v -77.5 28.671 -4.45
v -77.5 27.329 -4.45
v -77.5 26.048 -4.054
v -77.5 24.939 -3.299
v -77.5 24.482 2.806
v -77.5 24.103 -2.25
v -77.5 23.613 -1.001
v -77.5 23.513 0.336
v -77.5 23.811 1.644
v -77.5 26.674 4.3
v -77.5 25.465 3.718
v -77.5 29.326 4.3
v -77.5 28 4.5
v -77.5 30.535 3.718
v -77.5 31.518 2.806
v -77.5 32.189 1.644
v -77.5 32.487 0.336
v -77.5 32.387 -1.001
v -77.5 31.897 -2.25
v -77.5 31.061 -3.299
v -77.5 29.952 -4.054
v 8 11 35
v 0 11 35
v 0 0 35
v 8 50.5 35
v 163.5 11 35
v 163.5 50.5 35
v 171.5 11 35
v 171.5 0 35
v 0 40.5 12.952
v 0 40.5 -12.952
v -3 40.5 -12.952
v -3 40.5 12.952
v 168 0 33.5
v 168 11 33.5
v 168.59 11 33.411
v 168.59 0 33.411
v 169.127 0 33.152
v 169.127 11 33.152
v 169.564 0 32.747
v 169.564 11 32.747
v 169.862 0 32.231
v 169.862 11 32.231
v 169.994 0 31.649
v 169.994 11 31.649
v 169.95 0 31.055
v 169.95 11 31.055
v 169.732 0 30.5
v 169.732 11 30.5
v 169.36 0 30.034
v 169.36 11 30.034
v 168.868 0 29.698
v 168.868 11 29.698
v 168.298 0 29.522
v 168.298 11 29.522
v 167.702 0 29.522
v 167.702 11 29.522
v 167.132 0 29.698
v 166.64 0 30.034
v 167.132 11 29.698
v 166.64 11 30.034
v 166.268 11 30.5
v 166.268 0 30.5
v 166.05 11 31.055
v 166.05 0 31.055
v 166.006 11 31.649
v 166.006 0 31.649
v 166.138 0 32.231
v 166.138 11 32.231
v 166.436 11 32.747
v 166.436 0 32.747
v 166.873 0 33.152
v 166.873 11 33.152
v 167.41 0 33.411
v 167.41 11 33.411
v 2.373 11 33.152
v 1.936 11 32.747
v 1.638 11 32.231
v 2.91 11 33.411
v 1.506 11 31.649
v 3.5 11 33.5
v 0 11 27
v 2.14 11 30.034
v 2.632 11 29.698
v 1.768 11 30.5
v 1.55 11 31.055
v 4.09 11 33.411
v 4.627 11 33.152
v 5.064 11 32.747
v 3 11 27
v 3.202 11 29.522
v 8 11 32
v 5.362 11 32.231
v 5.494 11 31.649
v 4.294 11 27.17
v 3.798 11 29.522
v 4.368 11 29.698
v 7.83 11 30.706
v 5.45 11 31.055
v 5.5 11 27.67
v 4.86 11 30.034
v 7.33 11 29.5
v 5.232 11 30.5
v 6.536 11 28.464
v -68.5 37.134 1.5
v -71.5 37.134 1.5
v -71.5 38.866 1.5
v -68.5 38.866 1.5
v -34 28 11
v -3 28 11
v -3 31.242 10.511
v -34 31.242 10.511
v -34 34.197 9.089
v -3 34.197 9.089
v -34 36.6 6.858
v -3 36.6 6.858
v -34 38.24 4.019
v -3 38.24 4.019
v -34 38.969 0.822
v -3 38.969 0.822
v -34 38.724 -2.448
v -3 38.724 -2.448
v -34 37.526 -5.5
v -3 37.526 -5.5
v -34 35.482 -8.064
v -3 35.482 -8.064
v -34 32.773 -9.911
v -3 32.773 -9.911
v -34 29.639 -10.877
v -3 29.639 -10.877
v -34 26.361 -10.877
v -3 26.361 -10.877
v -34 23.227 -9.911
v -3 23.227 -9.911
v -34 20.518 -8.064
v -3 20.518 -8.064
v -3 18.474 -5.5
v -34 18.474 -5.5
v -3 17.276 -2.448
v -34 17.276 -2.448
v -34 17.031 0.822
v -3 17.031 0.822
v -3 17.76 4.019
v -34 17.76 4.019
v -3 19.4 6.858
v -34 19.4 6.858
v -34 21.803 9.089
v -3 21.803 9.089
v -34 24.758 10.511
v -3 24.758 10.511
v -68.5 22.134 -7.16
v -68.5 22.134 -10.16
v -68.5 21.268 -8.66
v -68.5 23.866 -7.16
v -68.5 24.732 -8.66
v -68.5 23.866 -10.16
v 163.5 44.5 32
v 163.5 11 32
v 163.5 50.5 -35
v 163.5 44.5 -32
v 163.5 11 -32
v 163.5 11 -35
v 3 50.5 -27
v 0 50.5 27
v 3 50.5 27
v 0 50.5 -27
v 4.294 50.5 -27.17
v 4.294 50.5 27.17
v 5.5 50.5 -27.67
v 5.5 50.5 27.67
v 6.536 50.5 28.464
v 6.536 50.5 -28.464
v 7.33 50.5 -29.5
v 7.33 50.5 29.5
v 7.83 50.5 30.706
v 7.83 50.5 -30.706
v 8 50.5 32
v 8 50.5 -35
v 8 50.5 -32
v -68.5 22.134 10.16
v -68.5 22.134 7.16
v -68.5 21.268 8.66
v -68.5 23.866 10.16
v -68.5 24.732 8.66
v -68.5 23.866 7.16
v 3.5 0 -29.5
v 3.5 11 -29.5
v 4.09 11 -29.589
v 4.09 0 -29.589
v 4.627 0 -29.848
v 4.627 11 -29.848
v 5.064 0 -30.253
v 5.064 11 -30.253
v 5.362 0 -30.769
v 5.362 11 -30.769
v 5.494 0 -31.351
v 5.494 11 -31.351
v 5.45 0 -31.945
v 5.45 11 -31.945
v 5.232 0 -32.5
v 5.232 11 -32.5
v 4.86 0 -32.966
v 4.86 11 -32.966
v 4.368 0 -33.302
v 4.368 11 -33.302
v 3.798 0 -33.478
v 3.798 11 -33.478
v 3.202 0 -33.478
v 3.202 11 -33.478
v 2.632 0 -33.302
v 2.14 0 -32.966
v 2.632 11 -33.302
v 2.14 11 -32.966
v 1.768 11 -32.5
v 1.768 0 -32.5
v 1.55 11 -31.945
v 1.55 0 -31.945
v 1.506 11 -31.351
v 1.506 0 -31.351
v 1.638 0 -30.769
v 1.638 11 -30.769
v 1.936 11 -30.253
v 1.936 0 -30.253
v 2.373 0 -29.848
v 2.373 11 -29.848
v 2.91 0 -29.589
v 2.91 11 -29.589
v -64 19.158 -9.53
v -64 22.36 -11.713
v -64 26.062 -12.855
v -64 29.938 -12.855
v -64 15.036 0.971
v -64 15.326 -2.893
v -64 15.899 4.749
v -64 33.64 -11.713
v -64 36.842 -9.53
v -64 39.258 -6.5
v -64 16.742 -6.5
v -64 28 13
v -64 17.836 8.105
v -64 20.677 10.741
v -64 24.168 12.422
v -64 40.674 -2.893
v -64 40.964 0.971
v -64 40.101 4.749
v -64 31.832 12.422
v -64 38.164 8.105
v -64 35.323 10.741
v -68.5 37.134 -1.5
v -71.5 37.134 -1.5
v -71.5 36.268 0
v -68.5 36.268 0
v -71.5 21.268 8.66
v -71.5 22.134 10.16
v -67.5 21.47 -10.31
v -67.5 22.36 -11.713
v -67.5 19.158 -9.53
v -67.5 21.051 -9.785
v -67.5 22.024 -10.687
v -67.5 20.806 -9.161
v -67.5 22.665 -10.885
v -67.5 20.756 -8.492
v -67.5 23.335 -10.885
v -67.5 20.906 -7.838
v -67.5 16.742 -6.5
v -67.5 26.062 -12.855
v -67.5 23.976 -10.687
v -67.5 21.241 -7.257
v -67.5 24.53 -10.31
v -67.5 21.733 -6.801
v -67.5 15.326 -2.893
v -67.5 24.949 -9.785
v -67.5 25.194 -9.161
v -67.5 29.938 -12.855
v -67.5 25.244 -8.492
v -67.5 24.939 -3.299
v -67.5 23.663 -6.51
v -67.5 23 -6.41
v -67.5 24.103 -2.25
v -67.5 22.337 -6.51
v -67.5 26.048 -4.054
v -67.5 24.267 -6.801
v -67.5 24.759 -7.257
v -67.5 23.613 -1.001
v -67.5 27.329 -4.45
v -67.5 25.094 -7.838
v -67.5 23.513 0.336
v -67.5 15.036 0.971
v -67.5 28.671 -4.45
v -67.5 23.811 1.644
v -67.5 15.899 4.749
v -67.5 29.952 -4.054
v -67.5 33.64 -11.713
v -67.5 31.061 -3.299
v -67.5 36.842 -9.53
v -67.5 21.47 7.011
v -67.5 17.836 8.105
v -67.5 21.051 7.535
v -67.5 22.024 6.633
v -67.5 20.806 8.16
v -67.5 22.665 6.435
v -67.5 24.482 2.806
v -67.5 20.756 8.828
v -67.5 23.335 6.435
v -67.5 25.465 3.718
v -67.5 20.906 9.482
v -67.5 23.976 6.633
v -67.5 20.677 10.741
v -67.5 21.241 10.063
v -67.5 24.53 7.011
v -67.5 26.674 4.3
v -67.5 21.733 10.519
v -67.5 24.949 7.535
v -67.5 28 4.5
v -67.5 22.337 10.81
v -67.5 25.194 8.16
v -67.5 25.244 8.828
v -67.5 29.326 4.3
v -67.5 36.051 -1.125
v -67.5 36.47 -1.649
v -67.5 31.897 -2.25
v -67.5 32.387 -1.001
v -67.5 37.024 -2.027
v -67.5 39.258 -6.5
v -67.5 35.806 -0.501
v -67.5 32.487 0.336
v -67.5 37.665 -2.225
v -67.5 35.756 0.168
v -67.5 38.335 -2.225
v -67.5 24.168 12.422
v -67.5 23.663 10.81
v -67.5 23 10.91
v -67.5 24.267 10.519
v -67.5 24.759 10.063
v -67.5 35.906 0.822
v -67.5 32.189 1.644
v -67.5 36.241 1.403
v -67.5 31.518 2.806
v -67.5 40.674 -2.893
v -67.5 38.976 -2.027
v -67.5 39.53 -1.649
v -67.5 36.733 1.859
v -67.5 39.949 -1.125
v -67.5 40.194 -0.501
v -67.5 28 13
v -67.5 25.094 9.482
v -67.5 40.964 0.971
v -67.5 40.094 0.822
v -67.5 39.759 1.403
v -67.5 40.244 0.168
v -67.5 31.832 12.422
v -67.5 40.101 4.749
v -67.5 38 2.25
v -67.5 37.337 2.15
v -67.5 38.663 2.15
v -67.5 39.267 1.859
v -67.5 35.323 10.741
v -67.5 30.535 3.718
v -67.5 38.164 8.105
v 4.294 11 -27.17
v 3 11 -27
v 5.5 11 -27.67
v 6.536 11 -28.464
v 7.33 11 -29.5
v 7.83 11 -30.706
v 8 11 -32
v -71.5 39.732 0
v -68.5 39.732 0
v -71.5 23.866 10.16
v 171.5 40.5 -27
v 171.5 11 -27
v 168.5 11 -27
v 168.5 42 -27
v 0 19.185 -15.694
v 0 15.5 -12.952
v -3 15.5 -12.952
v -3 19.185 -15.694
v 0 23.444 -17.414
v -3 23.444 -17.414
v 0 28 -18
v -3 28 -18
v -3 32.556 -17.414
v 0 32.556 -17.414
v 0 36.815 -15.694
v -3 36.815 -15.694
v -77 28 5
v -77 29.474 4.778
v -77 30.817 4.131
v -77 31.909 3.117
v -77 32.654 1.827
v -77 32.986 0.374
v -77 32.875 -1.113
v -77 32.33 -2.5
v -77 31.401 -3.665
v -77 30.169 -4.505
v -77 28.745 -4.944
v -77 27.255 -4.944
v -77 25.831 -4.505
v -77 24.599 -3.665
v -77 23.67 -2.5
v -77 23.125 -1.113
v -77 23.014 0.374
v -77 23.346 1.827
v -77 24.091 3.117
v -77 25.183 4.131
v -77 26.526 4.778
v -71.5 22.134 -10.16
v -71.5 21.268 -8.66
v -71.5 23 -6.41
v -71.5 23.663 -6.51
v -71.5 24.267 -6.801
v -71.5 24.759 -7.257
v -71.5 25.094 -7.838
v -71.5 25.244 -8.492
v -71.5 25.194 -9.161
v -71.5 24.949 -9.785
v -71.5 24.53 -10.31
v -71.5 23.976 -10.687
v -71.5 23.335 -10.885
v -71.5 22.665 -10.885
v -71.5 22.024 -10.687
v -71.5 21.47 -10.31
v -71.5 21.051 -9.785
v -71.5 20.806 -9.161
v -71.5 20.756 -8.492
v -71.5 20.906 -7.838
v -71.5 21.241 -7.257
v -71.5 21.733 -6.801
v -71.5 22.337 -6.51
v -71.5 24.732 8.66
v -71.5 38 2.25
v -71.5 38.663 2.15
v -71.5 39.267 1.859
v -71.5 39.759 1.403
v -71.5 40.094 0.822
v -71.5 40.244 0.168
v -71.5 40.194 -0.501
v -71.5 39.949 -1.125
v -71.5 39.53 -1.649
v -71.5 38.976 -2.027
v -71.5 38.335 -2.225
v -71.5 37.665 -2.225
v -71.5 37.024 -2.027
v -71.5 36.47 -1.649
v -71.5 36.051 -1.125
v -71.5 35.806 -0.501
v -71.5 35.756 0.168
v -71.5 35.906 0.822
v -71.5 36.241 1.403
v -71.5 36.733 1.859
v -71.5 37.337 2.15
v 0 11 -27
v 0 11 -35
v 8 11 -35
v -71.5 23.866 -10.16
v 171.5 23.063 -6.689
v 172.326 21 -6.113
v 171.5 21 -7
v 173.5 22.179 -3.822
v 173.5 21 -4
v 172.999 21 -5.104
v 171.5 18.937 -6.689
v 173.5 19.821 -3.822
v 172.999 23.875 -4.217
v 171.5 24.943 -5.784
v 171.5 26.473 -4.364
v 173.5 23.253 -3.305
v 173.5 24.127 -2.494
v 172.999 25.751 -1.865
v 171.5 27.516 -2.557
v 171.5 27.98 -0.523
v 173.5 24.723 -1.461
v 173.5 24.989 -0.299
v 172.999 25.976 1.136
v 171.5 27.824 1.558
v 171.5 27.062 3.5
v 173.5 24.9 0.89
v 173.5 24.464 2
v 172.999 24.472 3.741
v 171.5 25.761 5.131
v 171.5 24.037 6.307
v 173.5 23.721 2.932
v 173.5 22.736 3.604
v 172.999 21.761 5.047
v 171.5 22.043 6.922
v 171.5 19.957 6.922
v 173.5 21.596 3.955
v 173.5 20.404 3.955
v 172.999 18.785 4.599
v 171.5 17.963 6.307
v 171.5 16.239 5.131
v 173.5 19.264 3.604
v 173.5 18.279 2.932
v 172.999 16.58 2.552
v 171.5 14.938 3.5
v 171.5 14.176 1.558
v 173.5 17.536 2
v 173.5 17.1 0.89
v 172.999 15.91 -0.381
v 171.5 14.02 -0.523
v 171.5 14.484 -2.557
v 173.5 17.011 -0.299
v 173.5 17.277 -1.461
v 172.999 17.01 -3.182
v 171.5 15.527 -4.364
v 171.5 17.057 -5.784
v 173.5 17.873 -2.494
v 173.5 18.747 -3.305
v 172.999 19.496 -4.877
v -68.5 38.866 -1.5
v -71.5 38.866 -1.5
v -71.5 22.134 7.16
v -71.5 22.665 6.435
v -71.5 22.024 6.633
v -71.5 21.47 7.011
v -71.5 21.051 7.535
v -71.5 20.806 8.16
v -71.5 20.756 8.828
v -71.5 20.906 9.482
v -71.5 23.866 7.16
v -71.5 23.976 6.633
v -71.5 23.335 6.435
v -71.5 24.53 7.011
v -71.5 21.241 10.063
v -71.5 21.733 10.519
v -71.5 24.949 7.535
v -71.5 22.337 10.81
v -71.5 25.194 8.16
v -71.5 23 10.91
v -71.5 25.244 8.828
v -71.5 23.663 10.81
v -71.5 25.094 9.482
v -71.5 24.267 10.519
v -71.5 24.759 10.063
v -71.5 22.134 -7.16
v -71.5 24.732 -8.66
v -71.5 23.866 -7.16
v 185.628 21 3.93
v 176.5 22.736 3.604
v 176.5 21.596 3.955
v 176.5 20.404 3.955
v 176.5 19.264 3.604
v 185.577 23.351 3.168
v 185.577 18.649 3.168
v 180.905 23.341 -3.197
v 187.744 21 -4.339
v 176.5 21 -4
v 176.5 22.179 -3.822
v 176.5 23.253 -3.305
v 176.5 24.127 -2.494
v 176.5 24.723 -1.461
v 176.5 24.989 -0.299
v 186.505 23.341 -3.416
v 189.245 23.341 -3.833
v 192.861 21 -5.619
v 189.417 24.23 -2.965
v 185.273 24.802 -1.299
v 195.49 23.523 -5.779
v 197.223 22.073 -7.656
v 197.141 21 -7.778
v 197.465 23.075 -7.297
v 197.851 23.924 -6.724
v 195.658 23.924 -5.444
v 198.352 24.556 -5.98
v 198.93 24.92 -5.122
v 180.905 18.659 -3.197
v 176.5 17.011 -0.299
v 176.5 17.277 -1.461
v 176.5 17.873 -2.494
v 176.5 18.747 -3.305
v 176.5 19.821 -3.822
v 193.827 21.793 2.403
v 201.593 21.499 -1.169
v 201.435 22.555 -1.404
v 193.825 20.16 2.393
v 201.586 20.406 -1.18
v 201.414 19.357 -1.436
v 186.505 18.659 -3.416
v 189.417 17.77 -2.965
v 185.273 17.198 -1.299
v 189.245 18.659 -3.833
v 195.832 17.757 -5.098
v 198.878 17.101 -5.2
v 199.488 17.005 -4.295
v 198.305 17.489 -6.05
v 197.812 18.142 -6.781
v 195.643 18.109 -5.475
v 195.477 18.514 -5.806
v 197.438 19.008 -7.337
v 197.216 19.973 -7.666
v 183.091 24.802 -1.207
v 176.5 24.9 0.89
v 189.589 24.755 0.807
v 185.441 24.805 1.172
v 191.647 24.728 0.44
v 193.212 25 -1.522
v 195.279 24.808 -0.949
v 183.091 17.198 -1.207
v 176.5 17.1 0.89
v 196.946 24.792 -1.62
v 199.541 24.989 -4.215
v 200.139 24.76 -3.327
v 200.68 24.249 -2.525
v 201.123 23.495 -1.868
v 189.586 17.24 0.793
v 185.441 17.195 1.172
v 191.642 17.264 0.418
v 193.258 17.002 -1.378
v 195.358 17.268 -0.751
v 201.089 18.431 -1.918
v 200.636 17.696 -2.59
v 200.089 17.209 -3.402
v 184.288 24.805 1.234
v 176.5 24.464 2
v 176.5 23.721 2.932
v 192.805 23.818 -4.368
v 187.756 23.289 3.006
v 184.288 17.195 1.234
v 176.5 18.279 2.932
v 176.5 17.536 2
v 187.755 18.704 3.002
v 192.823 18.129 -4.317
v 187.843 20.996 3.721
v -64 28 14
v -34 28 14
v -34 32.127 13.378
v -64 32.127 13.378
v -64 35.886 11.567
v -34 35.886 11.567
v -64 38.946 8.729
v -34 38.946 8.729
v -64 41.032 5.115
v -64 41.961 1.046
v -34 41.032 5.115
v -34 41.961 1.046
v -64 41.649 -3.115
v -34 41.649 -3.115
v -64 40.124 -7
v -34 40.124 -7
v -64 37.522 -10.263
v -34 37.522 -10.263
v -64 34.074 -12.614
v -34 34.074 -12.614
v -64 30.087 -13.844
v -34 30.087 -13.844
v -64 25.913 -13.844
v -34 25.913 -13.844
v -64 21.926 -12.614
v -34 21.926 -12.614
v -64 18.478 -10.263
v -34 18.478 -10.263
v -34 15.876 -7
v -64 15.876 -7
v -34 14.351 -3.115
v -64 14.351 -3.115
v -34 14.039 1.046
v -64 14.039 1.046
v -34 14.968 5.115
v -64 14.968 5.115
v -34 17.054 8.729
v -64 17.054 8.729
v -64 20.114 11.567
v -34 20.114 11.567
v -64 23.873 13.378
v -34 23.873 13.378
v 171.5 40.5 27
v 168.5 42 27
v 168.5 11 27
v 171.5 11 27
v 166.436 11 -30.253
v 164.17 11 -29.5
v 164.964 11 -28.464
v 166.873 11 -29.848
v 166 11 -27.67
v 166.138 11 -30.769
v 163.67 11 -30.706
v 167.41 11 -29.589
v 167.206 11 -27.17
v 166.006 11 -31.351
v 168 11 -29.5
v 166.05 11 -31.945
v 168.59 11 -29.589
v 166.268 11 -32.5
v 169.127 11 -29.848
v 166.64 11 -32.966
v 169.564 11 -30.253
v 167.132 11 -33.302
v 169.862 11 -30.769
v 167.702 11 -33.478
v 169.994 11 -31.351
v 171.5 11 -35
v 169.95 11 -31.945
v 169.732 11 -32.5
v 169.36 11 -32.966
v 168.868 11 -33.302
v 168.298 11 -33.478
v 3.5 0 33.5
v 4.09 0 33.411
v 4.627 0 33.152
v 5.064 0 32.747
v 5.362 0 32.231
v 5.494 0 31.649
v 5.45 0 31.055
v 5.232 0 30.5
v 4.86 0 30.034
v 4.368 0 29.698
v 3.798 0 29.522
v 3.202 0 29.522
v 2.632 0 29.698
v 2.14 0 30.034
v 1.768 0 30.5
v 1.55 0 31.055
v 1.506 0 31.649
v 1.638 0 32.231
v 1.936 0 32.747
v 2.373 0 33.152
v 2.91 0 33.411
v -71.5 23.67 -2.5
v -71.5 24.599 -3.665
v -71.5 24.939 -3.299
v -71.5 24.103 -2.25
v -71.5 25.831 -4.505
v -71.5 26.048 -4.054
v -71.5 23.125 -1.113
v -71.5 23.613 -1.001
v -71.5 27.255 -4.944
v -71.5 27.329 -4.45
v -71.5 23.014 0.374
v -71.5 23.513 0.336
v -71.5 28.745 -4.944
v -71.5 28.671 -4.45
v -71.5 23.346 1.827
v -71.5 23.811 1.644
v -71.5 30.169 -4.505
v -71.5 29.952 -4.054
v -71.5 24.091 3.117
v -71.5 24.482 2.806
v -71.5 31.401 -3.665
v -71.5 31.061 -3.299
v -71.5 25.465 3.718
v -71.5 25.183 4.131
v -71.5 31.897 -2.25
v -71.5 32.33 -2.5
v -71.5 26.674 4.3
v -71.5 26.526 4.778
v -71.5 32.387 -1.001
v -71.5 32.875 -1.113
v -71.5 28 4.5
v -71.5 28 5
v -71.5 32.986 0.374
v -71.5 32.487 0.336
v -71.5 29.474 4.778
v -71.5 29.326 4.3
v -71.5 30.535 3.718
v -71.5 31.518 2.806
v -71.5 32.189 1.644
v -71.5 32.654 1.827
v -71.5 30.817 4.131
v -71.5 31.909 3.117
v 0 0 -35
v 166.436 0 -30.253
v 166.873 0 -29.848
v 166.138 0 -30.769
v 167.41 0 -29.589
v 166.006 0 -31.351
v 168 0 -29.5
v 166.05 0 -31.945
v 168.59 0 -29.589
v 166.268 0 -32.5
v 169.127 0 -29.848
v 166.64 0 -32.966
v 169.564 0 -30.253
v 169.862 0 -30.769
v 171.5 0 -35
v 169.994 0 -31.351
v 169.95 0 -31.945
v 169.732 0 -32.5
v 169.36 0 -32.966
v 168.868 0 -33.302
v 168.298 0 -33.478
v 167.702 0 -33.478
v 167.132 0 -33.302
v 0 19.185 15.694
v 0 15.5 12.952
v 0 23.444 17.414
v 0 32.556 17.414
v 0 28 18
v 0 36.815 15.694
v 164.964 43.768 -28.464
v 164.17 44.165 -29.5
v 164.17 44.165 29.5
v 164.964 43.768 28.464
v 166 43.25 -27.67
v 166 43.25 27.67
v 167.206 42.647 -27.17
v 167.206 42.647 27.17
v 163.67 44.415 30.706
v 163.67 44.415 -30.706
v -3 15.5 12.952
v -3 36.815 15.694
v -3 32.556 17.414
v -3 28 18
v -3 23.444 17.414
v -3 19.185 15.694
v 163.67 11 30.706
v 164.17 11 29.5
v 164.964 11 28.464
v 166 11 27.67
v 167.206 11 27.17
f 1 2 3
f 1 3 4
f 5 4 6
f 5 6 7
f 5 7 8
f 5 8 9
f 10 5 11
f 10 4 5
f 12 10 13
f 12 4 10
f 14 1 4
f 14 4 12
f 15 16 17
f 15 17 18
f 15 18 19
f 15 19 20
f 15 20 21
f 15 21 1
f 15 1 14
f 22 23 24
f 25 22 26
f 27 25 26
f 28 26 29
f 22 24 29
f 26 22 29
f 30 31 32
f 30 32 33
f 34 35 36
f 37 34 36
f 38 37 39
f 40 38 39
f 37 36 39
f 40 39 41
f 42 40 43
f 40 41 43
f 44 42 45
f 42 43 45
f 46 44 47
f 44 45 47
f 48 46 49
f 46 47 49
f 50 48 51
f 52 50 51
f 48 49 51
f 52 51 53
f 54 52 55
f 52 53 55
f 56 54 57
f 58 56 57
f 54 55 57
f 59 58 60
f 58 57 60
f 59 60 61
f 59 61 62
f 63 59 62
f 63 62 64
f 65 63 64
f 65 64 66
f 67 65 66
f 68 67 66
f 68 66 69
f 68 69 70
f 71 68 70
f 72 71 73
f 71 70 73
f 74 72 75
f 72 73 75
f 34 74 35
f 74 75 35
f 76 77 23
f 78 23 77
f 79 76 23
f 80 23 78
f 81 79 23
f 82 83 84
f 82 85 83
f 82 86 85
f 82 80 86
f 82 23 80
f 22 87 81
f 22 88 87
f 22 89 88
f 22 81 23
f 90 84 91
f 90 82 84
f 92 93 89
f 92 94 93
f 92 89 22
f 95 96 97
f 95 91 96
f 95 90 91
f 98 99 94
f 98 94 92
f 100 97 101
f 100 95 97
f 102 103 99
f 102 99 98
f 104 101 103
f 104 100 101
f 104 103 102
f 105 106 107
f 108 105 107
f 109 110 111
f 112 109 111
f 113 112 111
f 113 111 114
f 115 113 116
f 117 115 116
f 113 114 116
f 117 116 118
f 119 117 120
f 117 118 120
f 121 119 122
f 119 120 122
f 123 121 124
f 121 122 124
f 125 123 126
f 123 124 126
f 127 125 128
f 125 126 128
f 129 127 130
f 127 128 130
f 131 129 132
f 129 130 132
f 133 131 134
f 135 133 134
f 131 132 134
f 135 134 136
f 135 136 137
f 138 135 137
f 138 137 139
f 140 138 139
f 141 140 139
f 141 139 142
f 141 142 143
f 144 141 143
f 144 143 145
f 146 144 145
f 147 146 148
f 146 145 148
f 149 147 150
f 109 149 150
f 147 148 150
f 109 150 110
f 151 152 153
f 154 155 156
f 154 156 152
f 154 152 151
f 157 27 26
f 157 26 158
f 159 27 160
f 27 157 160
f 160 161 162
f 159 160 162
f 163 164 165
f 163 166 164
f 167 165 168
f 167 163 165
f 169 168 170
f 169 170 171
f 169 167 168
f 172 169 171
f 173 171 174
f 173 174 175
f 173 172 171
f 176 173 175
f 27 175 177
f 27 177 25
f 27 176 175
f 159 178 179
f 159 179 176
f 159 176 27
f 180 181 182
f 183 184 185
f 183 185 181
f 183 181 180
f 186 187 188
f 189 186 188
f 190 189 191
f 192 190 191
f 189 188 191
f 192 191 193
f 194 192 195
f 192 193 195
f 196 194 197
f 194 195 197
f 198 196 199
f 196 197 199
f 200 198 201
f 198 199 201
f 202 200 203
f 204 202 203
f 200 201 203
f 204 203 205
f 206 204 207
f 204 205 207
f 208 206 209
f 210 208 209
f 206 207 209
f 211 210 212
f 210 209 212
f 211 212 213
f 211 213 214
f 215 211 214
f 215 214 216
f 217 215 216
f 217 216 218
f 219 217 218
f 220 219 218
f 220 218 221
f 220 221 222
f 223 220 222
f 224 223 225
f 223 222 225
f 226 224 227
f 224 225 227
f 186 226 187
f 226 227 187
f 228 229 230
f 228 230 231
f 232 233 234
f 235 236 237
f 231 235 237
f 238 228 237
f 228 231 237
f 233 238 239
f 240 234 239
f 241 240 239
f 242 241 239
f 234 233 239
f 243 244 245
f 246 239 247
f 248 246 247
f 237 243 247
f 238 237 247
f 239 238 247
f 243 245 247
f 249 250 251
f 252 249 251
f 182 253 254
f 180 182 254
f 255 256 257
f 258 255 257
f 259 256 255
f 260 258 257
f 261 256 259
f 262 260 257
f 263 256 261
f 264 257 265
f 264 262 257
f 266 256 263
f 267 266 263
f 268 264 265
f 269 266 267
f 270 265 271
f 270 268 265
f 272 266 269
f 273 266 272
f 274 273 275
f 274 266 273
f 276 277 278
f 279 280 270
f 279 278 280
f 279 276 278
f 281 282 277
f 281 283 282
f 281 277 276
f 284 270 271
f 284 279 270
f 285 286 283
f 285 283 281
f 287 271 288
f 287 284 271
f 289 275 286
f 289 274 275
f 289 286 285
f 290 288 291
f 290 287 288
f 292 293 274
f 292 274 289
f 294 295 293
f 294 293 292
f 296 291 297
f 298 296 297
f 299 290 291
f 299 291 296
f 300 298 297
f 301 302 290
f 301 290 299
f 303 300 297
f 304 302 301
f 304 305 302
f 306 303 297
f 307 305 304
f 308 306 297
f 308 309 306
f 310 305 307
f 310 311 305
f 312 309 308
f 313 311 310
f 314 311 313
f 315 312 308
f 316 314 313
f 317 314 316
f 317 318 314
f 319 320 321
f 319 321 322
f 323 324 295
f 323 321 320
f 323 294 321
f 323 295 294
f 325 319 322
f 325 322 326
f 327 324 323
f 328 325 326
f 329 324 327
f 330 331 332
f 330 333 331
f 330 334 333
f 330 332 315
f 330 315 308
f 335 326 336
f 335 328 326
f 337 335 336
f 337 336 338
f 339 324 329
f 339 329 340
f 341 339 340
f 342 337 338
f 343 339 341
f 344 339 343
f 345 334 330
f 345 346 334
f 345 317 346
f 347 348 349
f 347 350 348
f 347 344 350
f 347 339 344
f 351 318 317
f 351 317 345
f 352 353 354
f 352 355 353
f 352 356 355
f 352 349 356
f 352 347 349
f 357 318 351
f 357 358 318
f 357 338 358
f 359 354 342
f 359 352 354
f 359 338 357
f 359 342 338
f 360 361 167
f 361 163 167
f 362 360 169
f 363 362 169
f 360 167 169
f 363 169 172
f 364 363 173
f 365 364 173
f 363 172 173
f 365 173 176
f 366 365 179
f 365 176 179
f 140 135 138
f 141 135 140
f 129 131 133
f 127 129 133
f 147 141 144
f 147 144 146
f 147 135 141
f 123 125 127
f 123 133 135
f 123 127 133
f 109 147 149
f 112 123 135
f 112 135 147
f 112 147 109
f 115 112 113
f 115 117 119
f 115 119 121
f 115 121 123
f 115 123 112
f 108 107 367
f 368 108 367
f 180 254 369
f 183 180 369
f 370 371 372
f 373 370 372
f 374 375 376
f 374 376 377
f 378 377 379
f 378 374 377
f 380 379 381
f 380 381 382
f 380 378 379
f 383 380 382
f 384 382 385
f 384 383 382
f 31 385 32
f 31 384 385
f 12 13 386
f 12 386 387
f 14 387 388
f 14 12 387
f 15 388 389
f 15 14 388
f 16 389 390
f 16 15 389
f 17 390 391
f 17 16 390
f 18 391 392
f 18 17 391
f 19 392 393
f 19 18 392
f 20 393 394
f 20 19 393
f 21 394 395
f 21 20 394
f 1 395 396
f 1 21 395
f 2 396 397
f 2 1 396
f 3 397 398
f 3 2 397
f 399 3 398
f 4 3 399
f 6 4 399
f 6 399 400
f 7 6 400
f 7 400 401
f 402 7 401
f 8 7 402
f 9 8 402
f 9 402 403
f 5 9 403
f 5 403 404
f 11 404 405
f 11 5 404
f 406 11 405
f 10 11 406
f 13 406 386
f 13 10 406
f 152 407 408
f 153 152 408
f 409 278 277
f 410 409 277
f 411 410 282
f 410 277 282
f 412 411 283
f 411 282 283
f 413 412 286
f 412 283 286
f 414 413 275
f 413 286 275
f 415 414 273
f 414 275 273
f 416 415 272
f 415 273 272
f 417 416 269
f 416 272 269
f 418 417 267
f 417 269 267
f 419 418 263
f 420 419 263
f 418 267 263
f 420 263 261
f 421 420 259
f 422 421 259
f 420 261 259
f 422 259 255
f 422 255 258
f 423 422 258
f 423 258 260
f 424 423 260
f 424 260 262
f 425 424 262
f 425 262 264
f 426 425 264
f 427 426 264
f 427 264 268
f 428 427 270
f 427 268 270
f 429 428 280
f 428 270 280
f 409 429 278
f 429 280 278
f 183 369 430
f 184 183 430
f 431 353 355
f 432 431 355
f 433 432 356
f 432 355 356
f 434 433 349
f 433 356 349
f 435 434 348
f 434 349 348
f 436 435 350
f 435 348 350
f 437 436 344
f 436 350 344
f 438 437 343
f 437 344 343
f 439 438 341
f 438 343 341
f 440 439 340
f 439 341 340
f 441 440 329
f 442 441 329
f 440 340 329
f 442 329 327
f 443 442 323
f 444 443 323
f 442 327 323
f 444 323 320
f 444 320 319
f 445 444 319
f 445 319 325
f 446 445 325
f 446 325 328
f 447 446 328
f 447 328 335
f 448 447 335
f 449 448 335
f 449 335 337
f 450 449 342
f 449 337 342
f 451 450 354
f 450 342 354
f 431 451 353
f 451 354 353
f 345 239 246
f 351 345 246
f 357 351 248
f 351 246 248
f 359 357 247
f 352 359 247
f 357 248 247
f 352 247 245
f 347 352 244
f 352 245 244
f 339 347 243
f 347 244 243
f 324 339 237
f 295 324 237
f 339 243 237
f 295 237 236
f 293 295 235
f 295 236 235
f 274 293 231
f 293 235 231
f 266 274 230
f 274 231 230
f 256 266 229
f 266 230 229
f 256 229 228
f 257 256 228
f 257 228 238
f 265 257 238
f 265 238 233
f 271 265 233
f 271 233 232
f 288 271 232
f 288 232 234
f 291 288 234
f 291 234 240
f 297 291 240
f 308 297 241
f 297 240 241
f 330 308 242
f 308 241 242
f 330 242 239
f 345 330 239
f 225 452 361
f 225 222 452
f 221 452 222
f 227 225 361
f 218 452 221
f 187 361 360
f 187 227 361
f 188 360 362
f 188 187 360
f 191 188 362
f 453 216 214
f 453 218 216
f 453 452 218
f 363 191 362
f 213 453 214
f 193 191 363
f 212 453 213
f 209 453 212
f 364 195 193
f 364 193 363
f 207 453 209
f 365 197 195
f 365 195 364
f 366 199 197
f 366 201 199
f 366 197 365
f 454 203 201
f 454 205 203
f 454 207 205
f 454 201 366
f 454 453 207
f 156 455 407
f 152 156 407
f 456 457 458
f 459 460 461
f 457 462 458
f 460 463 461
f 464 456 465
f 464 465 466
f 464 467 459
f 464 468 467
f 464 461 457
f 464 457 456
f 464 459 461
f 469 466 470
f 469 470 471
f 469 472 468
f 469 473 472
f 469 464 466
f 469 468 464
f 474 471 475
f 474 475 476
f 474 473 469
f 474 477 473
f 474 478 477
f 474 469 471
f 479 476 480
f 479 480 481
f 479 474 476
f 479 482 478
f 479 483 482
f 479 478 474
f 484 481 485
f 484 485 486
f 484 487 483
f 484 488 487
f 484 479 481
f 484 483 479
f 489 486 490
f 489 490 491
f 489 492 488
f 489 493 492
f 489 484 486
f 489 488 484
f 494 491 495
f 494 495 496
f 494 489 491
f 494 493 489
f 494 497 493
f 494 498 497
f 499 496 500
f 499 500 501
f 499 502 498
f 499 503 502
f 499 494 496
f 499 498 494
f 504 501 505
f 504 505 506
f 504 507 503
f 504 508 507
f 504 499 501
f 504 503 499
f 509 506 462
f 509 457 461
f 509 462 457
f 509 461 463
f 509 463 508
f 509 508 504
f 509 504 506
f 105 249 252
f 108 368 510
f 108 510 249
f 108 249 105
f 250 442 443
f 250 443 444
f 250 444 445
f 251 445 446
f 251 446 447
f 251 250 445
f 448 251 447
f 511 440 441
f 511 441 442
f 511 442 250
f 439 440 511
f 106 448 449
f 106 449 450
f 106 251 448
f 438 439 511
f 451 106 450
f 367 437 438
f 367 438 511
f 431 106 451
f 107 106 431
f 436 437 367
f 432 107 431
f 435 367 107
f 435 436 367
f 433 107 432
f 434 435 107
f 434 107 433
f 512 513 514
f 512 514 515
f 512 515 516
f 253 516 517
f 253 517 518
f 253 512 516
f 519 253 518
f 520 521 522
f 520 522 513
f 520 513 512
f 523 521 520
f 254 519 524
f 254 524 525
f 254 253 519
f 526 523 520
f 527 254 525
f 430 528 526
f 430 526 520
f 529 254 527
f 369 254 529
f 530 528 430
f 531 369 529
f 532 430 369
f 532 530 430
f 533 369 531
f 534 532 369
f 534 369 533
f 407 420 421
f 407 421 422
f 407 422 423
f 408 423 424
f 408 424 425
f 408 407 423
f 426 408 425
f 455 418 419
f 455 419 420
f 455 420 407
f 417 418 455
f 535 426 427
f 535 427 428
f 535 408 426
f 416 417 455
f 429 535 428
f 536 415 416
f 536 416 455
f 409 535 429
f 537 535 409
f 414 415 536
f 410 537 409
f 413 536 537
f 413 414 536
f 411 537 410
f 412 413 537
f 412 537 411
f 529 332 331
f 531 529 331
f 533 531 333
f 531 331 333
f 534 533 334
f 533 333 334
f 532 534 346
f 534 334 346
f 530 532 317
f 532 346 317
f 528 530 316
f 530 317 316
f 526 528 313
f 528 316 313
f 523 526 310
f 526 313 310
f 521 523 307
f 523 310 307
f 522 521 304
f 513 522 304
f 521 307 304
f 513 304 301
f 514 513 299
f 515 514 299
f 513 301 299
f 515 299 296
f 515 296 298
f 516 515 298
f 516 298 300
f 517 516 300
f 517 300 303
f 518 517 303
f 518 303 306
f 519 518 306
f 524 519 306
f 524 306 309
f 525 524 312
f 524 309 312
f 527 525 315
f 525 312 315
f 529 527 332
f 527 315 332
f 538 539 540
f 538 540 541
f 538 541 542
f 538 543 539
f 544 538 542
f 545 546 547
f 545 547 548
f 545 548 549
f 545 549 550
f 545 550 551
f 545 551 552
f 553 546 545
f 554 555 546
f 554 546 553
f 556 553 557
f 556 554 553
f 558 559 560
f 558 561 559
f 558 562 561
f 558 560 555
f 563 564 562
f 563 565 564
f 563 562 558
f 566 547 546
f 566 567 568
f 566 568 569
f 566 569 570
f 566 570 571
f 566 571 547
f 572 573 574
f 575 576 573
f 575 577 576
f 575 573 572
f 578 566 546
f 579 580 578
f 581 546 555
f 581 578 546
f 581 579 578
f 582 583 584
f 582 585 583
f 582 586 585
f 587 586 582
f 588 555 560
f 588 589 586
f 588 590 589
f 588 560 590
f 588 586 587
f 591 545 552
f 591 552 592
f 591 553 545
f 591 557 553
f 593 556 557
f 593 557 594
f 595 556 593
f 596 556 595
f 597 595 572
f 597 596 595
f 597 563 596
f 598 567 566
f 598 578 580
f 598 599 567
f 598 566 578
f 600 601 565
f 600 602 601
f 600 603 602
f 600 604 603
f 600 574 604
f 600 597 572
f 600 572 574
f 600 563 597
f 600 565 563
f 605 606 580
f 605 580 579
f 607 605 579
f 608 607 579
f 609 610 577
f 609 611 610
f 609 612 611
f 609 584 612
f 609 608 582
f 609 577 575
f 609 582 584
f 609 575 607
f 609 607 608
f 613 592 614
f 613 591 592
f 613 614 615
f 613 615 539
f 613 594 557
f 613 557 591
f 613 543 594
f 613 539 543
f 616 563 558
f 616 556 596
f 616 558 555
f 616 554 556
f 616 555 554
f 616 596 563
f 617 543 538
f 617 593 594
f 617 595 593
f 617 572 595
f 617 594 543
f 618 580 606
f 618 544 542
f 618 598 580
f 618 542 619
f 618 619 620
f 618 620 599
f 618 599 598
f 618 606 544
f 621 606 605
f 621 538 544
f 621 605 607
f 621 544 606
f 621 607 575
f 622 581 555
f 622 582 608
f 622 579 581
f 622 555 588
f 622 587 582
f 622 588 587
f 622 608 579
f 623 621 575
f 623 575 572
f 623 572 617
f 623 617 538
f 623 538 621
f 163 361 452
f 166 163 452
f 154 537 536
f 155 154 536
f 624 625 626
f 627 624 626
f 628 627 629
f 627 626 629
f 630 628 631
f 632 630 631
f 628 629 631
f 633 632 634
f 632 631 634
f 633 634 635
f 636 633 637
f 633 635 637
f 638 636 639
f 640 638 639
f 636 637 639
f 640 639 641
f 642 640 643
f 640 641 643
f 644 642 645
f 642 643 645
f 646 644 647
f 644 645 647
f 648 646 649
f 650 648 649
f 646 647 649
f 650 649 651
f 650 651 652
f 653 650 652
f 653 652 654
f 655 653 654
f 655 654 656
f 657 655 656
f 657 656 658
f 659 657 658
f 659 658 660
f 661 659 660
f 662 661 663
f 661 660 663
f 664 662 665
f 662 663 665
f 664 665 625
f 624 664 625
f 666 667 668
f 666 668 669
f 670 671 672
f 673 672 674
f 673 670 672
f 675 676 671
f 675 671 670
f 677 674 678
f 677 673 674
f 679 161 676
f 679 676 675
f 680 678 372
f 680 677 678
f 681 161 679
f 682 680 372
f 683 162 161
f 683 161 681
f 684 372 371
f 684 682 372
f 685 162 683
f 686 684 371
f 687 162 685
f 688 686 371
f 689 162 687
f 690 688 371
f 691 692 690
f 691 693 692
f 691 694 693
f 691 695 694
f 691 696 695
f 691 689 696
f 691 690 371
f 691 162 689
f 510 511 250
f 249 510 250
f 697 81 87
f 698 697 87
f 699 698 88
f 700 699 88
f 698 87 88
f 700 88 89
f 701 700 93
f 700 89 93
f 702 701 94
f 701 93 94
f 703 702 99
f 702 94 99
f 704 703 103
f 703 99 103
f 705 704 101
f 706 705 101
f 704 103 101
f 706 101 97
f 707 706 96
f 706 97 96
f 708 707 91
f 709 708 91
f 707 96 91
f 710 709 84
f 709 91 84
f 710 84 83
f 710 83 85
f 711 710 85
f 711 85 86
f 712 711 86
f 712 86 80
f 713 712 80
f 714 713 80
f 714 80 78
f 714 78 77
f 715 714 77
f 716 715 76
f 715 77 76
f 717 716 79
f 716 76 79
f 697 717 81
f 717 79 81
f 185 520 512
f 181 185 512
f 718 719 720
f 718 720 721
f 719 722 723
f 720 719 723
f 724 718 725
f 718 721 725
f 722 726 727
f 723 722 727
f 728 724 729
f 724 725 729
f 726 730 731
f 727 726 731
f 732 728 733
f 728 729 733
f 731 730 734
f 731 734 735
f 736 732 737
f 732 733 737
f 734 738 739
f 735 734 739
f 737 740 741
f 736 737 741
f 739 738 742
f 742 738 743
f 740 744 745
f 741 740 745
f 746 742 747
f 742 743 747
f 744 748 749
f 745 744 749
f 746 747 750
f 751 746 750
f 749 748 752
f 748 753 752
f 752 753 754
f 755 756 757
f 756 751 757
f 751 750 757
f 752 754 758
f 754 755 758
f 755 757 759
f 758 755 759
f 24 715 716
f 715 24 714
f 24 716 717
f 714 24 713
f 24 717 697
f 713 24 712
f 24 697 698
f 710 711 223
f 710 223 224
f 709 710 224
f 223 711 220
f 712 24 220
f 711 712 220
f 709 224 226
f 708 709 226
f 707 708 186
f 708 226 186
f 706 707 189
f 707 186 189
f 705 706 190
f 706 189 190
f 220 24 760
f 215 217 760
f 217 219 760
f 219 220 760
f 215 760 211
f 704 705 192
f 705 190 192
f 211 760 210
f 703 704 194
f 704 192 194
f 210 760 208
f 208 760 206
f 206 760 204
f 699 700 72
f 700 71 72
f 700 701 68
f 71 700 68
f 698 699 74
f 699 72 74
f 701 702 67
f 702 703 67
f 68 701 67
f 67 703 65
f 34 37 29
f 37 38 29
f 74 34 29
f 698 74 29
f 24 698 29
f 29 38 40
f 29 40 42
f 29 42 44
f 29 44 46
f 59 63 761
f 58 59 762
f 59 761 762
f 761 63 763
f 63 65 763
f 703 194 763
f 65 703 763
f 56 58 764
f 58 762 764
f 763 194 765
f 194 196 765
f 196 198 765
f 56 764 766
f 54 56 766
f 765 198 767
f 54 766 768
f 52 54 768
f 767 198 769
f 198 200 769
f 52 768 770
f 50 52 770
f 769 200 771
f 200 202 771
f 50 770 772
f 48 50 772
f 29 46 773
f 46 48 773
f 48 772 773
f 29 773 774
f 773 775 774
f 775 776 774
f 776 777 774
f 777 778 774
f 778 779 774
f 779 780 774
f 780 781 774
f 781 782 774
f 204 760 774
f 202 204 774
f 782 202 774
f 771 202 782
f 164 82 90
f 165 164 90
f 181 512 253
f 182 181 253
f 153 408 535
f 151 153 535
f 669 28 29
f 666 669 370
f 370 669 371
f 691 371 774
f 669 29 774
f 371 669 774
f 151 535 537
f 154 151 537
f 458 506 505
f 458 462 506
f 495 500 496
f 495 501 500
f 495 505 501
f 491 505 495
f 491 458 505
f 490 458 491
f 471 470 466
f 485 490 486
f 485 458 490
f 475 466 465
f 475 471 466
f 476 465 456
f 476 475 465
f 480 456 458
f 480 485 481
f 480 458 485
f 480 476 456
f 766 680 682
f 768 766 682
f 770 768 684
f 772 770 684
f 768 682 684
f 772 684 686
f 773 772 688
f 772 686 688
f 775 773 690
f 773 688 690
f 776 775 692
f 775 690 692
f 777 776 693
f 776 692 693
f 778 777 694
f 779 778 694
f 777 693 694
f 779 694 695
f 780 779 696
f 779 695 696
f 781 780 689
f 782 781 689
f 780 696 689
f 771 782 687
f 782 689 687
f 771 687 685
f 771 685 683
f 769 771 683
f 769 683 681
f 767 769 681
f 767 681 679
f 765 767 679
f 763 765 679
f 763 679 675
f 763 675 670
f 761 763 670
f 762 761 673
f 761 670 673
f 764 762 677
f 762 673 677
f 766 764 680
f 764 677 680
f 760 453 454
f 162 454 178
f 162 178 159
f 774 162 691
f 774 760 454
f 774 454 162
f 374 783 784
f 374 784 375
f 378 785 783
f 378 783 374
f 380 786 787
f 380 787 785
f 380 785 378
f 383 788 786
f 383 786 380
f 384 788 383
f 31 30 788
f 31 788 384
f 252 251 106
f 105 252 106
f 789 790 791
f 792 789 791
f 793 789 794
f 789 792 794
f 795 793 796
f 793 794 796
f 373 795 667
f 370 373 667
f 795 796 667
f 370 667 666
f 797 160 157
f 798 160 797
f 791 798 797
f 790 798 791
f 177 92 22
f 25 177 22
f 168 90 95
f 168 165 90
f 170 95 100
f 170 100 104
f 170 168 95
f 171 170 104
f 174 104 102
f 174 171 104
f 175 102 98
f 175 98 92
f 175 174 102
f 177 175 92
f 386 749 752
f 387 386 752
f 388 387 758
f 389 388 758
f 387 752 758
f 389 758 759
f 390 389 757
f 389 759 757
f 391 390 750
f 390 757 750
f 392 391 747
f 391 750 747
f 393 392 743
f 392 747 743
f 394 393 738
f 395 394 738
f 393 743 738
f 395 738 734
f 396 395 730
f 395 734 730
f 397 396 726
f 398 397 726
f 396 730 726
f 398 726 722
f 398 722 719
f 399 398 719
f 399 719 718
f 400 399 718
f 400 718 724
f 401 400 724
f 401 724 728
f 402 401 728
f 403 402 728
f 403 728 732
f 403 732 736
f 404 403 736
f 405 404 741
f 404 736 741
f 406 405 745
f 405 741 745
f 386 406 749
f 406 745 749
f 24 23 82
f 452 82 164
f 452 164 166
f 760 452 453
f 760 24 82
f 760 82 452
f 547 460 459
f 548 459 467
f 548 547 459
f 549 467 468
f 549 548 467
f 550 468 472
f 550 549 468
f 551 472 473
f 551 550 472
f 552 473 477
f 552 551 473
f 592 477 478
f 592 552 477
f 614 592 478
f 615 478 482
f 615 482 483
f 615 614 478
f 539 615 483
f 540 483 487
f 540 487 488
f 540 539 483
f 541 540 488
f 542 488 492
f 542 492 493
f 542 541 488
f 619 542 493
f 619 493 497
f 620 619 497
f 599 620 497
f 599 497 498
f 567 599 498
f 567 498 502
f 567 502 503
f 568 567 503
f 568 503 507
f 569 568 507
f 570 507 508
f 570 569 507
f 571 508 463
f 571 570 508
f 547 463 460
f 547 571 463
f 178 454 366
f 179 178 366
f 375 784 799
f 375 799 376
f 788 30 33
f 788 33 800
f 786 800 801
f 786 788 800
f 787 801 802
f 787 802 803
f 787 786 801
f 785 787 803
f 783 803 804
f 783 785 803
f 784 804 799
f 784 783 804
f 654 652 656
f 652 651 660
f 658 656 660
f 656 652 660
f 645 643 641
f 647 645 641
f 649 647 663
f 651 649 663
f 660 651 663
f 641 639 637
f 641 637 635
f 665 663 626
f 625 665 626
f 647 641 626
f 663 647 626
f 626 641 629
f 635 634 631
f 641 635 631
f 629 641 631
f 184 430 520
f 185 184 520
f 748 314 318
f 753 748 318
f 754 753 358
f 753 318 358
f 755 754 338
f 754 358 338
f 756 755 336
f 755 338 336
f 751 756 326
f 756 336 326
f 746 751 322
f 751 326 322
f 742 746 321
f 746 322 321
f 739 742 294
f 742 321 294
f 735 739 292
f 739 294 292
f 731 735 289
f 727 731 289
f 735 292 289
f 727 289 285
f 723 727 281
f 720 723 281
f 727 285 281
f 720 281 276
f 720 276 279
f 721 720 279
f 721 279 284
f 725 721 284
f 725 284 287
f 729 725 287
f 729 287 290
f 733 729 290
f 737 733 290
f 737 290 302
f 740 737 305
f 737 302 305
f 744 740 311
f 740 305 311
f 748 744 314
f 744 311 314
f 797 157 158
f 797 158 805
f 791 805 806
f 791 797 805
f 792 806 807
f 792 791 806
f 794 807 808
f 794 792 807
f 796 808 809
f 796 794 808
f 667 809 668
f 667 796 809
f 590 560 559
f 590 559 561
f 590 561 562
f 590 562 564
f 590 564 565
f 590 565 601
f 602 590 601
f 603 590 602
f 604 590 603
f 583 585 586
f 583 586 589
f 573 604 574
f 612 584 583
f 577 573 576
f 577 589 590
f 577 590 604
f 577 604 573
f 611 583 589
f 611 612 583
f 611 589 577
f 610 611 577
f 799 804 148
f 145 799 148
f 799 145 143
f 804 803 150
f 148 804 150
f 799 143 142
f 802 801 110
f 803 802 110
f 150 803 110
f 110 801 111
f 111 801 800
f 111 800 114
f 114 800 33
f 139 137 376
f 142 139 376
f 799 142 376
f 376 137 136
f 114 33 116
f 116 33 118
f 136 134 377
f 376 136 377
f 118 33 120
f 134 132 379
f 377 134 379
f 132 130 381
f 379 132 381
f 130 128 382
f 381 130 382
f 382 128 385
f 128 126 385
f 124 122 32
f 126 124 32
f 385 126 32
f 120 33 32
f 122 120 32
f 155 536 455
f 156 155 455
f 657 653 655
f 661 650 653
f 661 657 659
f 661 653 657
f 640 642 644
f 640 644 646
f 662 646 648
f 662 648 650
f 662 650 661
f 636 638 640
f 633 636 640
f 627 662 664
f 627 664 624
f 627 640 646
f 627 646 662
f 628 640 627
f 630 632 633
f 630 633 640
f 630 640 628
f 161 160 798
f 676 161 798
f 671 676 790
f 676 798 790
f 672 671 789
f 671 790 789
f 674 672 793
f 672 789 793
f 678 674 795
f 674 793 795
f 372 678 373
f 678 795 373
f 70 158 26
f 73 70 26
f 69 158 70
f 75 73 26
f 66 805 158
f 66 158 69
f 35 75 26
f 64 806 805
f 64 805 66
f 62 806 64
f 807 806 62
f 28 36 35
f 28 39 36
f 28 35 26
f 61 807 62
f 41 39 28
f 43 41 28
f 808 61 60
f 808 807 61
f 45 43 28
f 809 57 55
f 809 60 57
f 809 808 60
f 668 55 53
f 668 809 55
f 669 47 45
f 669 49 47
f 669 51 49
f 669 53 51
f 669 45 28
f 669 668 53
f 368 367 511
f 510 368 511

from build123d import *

# Parameters (mm, degrees)
SKETCH1_W           = 171.5
SKETCH1_H           = 70
BOSS_EXTRUDE1_DEPTH = 11
BOSS_EXTRUDE2_DEPTH = 39.5
FILLET1_R           = 5
SKETCH3_W           = 8
SKETCH3_H           = 70
CUT_EXTRUDE1_DEPTH  = 6
CUT_EXTRUDE2_REACH  = 193.996
BOSS_EXTRUDE3_DEPTH = 3
SKETCH6_R           = 11
BOSS_EXTRUDE4_DEPTH = 31
SKETCH7_R           = 14
BOSS_EXTRUDE5_DEPTH = 30
SKETCH8_R           = 13
BOSS_EXTRUDE6_DEPTH = 3.5
SKETCH9_R           = 2.25
BOSS_EXTRUDE7_DEPTH = 4
CUT_EXTRUDE3_DEPTH  = 3
SKETCH11_R          = 4.5
BOSS_EXTRUDE8_DEPTH = 4
SKETCH12_R          = 5
BOSS_EXTRUDE9_DEPTH = 6
CHAMFER1_SIZE       = 0.5
SKETCH13_R          = 2
CUT_EXTRUDE4_DEPTH  = 11
SKETCH15_R          = 4


with BuildPart() as part:
    # Sketch1 → Boss-Extrude1 (new body)
    with BuildSketch(Plane(origin=(0, 0, 0), x_dir=(1, 0, 0), z_dir=(0, 1, 0))):
        with Locations((85.75, 0)):
            Rectangle(SKETCH1_W, SKETCH1_H)
    extrude(amount=BOSS_EXTRUDE1_DEPTH)

    # Sketch2 → Boss-Extrude2 (add)
    with BuildSketch(Plane(origin=(0, 11, 0), x_dir=(1, 0, 0), z_dir=(0, 1, 0))):
        Polygon((0, 27), (0, -27), (8, -27), (8, -35), (163.5, -35), (163.5, -27), (171.5, -27), (171.5, 27), (163.5, 27), (163.5, 35), (8, 35), (8, 27), align=None)
    extrude(amount=BOSS_EXTRUDE2_DEPTH)

    # Fillet1
    fillet1_edges = [part.edges().sort_by_distance(p)[0] for p in [
        (8, 30.75, -27),
        (8, 30.75, 27),
        (163.5, 30.75, 27),
        (163.5, 30.75, -27),
    ]]
    fillet(fillet1_edges, radius=FILLET1_R)

    # Sketch3 → Cut-Extrude1 (cut)
    with BuildSketch(Plane(origin=(0, 50.5, 0), x_dir=(1, 0, 0), z_dir=(0, 1, 0))):
        with Locations((167.5, 0)):
            Rectangle(SKETCH3_W, SKETCH3_H)
    extrude(amount=-CUT_EXTRUDE1_DEPTH, mode=Mode.SUBTRACT)

    # Sketch4 → Cut-Extrude2 (cut, up to next)
    with BuildSketch(Plane.XY.offset(35), mode=Mode.PRIVATE) as cut_extrude2_sk1:
        Polygon((163.5, 44.5), (171.5, 40.5), (171.5, 44.5), align=None)
    cut_extrude2_tool1 = extrude(cut_extrude2_sk1.sketch, amount=-CUT_EXTRUDE2_REACH, mode=Mode.PRIVATE) & part.part
    add(cut_extrude2_tool1.solids().sort_by_distance((168.833333, 43.166667, 35))[0], mode=Mode.SUBTRACT)

    # Sketch13 → Cut-Extrude4 (cut)
    with BuildSketch(Plane(origin=(0, 11, 0), x_dir=(1, 0, 0), z_dir=(0, 1, 0))):
        with Locations(Location((3.5, 31.5, 0), (0, 0, 270))):
            Circle(SKETCH13_R)
        with Locations(Location((3.5, -31.5, 0), (0, 0, 270))):
            Circle(SKETCH13_R)
        with Locations(Location((168, -31.5, 0), (0, 0, 270))):
            Circle(SKETCH13_R)
        with Locations(Location((168, 31.5, 0), (0, 0, 270))):
            Circle(SKETCH13_R)
    extrude(amount=-CUT_EXTRUDE4_DEPTH, mode=Mode.SUBTRACT)


with BuildPart() as body_2:
    # Sketch5 → Boss-Extrude3 (new body)
    with BuildSketch(Plane.ZY):
        with BuildLine():
            Line((-12.951833847, 40.5), (12.951833847, 40.5))
            ThreePointArc((12.951833847, 40.5), (18, 28), (12.951833847, 15.5))
            Line((12.951833847, 15.5), (-12.951833847, 15.5))
            ThreePointArc((-12.951833847, 15.5), (-18, 28), (-12.951833847, 40.5))
        make_face()
    extrude(amount=BOSS_EXTRUDE3_DEPTH)

    # Sketch6 → Boss-Extrude4 (add)
    with BuildSketch(Plane.ZY.offset(3)):
        with Locations((0, 28)):
            Circle(SKETCH6_R)
    extrude(amount=BOSS_EXTRUDE4_DEPTH)


with BuildPart() as body_3:
    # Sketch7 → Boss-Extrude5 (new body)
    with BuildSketch(Plane.ZY.offset(34)):
        with Locations((0, 28)):
            Circle(SKETCH7_R)
    extrude(amount=BOSS_EXTRUDE5_DEPTH)


with BuildPart() as body_4:
    # Sketch8 → Boss-Extrude6 (new body)
    with BuildSketch(Plane.ZY.offset(64)):
        with Locations((0, 28)):
            Circle(SKETCH8_R)
    extrude(amount=BOSS_EXTRUDE6_DEPTH)

    # Sketch9 → Boss-Extrude7 (add)
    with BuildSketch(Plane.ZY.offset(67.5)):
        with Locations((0, 38)):
            Circle(SKETCH9_R)
        with Locations((8.660254038, 23)):
            Circle(SKETCH9_R)
        with Locations((-8.660254038, 23)):
            Circle(SKETCH9_R)
    extrude(amount=BOSS_EXTRUDE7_DEPTH)

    # Sketch10 → Cut-Extrude3 (cut)
    with BuildSketch(Plane.ZY.offset(71.5)):
        Polygon((1.5, 37.133974596), (1.5, 38.866025404), (0, 39.732050808), (-1.5, 38.866025404), (-1.5, 37.133974596), (0, 36.267949192), align=None)
        Polygon((10.160254038, 23.866025404), (8.660254038, 24.732050808), (7.160254038, 23.866025404), (7.160254038, 22.133974596), (8.660254038, 21.267949192), (10.160254038, 22.133974596), align=None)
        Polygon((-7.160254038, 23.866025404), (-8.660254038, 24.732050808), (-10.160254038, 23.866025404), (-10.160254038, 22.133974596), (-8.660254038, 21.267949192), (-7.160254038, 22.133974596), align=None)
    extrude(amount=-CUT_EXTRUDE3_DEPTH, mode=Mode.SUBTRACT)



with BuildPart() as body_5:
    # Sketch11 → Boss-Extrude8 (new body)
    with BuildSketch(Plane.ZY.offset(67.5)):
        with Locations((0, 28)):
            Circle(SKETCH11_R)
    extrude(amount=BOSS_EXTRUDE8_DEPTH)


with BuildPart() as body_4_1:
    add(body_4.part)

    add(body_5.part)  # Boss-Extrude9 merges body 5
    # Sketch12 → Boss-Extrude9 (add)
    with BuildSketch(Plane.ZY.offset(71.5)):
        with Locations((0, 28)):
            Circle(SKETCH12_R)
    extrude(amount=BOSS_EXTRUDE9_DEPTH)

    # Chamfer1
    chamfer1_edges = [body_4_1.edges().sort_by_distance(p)[0] for p in [
        (-77.5, 28, -5),
    ]]
    chamfer(chamfer1_edges, length=CHAMFER1_SIZE)


with BuildPart() as body_5_2:
    # Sweep1: sweep along a curve in space
    with BuildLine() as sweep1_path:
        Line((171.5, 21, 0), (176.5, 21, 0))
        add(Edge.make_bspline(
            [(176.5, 21, 0), (179.364212524, 21, 0), (187.383678788, 21, 0.380028995), (195.27639291, 21, -1.698433096), (199.375985718, 21, -4.460350641)],
            knots=[0, 0, 0, 0, 0.374775681, 1, 1, 1, 1], degree=3))
    # Sketch15 → Sweep1 (sweep)
    with BuildSketch(Plane(origin=(171.5, 0, 0), x_dir=(0, 0, -1), z_dir=(1, 0, 0))):
        with Locations((0, 21)):
            Circle(SKETCH15_R)
    sweep(path=sweep1_path.line)

    # Sketch16 → Revolve1 (revolve)
    with BuildSketch(Plane.XY, mode=Mode.PRIVATE) as revolve1_sk:
        with BuildLine():
            Line((171.5, 25), (171.5, 28))
            ThreePointArc((171.5, 28), (172.682959631, 26.621973088), (173.5, 25))
            Line((173.5, 25), (171.5, 25))
        make_face()
    revolve(revolve1_sk.sketch.rotate(Axis((171.5, 21, 0), (1, 0, 0)), 270), axis=Axis((171.5, 21, 0), (1, 0, 0)))


solid = Compound([part.part, body_2.part, body_3.part, body_4_1.part, body_5_2.part])
